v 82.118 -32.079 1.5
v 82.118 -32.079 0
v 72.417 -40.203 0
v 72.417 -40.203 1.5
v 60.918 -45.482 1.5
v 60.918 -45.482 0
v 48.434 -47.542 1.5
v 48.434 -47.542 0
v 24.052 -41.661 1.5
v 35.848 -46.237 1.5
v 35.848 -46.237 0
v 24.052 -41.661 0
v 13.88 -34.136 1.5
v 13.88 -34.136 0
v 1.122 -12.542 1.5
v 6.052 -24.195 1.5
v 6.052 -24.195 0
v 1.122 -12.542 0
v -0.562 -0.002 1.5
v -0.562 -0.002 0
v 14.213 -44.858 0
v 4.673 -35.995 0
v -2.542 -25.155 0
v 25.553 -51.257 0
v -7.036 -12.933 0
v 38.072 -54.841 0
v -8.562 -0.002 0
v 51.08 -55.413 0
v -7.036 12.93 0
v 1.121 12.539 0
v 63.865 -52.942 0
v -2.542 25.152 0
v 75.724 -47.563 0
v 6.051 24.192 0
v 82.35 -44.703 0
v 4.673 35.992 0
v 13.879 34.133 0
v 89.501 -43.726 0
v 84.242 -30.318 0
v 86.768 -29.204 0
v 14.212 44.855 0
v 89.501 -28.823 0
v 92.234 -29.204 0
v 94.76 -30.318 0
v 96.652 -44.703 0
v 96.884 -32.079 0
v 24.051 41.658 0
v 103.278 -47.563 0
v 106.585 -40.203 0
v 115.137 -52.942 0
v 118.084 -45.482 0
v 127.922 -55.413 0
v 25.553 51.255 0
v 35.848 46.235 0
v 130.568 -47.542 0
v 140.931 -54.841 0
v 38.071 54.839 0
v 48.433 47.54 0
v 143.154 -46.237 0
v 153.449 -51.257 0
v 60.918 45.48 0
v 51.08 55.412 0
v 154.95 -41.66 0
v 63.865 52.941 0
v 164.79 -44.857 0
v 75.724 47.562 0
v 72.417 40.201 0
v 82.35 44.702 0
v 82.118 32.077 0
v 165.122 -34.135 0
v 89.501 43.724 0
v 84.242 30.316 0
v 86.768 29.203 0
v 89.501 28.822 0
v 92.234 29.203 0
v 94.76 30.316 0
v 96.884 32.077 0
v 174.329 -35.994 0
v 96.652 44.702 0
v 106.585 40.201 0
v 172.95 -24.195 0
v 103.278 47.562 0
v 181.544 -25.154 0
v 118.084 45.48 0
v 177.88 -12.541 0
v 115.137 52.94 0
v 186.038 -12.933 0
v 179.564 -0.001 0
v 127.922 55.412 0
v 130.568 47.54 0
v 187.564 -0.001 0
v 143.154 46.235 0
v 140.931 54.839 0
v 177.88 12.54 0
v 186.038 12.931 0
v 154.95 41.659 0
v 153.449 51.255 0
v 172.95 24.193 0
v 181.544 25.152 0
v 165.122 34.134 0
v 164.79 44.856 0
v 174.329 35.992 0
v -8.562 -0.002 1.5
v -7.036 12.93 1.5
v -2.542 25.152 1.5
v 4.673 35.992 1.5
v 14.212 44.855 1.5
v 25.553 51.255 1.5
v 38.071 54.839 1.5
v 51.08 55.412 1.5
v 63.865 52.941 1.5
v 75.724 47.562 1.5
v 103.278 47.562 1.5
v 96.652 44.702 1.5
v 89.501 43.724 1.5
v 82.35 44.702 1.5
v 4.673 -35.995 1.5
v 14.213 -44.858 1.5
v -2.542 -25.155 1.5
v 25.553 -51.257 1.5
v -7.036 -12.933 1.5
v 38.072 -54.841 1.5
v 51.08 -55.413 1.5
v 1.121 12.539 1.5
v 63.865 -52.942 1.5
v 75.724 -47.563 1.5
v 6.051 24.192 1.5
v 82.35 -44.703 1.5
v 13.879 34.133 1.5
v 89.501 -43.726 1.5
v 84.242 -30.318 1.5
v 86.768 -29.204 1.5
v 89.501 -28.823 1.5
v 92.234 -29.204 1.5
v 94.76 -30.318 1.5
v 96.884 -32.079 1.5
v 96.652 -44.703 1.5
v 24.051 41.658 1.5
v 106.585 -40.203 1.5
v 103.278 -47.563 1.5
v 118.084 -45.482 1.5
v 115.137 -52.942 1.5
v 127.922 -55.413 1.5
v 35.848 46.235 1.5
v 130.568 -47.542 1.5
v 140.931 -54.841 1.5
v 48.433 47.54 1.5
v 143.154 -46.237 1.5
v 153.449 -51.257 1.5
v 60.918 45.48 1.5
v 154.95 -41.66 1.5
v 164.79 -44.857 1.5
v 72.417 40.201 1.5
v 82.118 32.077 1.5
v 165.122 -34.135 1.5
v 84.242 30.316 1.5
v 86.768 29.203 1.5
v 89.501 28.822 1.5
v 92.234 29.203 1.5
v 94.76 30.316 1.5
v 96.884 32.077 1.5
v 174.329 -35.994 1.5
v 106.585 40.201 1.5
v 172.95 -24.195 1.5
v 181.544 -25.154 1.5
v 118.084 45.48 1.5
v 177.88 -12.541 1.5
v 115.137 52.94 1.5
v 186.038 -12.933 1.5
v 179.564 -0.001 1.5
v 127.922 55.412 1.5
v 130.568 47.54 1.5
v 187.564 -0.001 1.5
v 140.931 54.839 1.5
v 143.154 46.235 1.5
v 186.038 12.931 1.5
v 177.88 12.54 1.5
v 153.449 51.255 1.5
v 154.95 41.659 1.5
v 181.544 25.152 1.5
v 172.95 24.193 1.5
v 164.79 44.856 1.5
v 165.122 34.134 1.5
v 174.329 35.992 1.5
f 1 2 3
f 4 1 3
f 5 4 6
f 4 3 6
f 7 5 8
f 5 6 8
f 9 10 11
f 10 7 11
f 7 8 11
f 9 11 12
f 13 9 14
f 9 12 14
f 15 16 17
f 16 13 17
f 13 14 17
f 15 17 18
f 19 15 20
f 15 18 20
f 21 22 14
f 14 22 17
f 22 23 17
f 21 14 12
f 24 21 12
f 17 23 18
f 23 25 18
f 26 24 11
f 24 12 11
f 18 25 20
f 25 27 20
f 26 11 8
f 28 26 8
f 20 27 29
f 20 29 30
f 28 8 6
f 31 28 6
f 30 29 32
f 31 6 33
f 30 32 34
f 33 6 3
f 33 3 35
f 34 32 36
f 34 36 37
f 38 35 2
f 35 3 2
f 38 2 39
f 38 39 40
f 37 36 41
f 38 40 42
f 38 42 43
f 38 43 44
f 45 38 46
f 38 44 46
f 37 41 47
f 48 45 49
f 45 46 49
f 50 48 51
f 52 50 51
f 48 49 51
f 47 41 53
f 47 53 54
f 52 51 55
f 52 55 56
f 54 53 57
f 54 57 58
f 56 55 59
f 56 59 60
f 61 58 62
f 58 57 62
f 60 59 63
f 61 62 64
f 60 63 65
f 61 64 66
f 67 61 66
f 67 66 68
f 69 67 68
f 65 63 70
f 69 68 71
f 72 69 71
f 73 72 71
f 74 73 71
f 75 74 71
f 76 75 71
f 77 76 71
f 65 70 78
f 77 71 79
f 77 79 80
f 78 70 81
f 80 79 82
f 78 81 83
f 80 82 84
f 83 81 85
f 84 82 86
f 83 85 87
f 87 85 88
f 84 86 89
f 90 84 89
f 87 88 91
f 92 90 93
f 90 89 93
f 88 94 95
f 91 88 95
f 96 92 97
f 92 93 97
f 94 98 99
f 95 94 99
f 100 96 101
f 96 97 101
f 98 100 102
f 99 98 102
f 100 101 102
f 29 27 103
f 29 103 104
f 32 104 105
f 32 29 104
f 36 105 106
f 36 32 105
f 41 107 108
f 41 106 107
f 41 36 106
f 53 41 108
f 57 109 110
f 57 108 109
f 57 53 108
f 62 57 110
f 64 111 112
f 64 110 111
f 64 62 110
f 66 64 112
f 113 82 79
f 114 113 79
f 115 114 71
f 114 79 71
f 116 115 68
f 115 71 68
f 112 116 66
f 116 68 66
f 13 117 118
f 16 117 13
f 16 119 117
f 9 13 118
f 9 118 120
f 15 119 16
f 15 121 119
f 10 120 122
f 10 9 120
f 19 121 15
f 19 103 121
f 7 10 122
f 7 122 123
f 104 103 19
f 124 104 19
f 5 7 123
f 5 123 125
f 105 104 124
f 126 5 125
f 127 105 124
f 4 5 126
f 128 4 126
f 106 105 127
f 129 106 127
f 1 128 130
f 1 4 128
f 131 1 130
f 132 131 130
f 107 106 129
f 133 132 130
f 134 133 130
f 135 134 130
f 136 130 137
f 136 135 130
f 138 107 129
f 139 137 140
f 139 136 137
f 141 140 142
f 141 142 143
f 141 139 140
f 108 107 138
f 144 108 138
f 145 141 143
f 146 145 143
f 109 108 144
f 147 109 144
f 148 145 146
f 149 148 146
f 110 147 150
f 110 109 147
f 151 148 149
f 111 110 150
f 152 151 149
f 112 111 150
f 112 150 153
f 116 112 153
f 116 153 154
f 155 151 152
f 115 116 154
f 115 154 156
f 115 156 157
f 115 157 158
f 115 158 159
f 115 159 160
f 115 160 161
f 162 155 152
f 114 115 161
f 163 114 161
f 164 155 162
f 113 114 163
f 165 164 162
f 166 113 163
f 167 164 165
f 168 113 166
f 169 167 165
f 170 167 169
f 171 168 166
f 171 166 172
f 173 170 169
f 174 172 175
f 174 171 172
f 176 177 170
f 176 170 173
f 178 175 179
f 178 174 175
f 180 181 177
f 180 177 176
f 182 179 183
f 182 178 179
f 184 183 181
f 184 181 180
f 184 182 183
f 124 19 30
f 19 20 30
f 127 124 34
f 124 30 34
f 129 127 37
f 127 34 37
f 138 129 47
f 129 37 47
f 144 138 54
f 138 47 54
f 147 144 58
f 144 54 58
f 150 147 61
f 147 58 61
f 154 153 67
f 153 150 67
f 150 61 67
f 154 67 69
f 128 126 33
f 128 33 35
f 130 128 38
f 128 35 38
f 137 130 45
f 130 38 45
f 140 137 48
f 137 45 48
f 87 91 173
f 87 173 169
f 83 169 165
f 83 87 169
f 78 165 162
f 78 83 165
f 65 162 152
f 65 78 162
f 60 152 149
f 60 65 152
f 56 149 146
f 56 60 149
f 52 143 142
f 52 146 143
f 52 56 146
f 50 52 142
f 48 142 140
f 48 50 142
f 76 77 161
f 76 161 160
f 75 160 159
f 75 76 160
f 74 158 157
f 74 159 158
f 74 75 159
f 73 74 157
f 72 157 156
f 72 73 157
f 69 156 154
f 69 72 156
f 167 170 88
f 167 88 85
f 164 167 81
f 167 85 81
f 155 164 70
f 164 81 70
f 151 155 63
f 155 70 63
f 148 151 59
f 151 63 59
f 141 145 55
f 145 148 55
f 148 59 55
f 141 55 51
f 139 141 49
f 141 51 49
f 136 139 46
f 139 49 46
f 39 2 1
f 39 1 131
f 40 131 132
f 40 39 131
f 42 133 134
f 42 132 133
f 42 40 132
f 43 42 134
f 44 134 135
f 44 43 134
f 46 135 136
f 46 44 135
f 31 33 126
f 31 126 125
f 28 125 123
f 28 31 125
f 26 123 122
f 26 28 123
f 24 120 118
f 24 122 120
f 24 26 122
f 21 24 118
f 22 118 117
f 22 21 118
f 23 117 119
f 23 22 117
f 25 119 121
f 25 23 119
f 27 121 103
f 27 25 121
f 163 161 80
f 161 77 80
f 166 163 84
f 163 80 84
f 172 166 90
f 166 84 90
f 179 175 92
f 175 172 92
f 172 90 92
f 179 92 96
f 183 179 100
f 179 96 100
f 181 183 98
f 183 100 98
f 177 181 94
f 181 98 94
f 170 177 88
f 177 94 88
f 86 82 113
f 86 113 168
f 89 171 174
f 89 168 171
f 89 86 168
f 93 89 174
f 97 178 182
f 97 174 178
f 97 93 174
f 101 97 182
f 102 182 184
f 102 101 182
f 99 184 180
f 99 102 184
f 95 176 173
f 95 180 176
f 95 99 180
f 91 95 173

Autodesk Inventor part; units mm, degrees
ref_plane "YZ Plane" through (0, 0, 0) normal (1, 0, 0) x (0, 1, 0)
ref_plane "XZ Plane" through (0, 0, 0) normal (0, 1, 0) x (-1, 0, 0)
ref_plane "XY Plane" through (0, 0, 0) normal (0, 0, 1) x (1, 0, 0)
sketch "Sketch1" plane through (0, 0, 0) normal (0, 0, 1) x (1, 0, 0)
  line L0 (-11.999, -0.0009) -> (209.001, -0.0009) construction
  circle A0 centre (47.001, -0.0009) radius 42.5 construction
  circle A1 centre (132.001, -0.0009) radius 42.5 construction
  circle A2 centre (47.001, -0.0009) radius 47.5625 construction
  circle A3 centre (132.001, -0.0009) radius 47.5625 construction
  arc A4 (82.1177, 32.0773) -> (-0.5615, -0.0019) centre (47.001, -0.0009) ccw
  arc A5 (179.5635, -0.0009) -> (96.8843, 32.0773) centre (132.001, -0.0009) ccw
  arc A6 (-0.5615, -0.0019) -> (82.1177, -32.079) centre (47.001, -0.0009) ccw
  arc A7 (96.8843, -32.079) -> (179.5635, -0.0009) centre (132.001, -0.0009) ccw
  arc A8 (75.7238, 47.5616) -> (-8.5615, -0.0015) centre (47.001, -0.0009) ccw
  arc A9 (187.5635, -0.0009) -> (103.2782, 47.5616) centre (132.001, -0.0009) ccw
  line L1 (47.001, 47.5616) -> (132.001, 47.5616) construction
  arc A10 (75.7238, 47.5616) -> (103.2782, 47.5616) centre (89.501, 70.3754) ccw
  arc A11 (-8.5615, -0.0015) -> (75.7238, -47.5634) centre (47.001, -0.0009) ccw
  arc A12 (103.2782, -47.5634) -> (75.7238, -47.5634) centre (89.501, -70.3772) ccw
  arc A13 (103.2782, -47.5634) -> (187.5635, -0.0009) centre (132.001, -0.0009) ccw
  arc A14 (82.1177, 32.0773) -> (96.8843, 32.0773) centre (89.501, 38.8217) ccw
  line L2 (82.1177, 32.0773) -> (96.8843, 32.0773) construction
  arc A15 (96.8843, -32.079) -> (82.1177, -32.079) centre (89.501, -38.8234) ccw
  point P0 (0, 0)
  point P1 (89.501, 21.3519)
  point P2 (46.9513, 55.5616)
  point P3 (132.0501, 55.5616)
  dimension "d0" = 221
  dimension "d1" = 85
  dimension "d2" = 85
  dimension "d3" = 85
  dimension "d4" = 95.125
  dimension "d5" = 95.125
  dimension "d6" = 8
  dimension "d7" = 10
extrude "Extrusion1" add sketch "Sketch1" along normal blind 1.5
equation "\"d2\" = d1"
equation "\"d3\" = d1"
equation "\"d5\" = d4"
properties part number "Dichtung" material "Rubber, Silicone"
